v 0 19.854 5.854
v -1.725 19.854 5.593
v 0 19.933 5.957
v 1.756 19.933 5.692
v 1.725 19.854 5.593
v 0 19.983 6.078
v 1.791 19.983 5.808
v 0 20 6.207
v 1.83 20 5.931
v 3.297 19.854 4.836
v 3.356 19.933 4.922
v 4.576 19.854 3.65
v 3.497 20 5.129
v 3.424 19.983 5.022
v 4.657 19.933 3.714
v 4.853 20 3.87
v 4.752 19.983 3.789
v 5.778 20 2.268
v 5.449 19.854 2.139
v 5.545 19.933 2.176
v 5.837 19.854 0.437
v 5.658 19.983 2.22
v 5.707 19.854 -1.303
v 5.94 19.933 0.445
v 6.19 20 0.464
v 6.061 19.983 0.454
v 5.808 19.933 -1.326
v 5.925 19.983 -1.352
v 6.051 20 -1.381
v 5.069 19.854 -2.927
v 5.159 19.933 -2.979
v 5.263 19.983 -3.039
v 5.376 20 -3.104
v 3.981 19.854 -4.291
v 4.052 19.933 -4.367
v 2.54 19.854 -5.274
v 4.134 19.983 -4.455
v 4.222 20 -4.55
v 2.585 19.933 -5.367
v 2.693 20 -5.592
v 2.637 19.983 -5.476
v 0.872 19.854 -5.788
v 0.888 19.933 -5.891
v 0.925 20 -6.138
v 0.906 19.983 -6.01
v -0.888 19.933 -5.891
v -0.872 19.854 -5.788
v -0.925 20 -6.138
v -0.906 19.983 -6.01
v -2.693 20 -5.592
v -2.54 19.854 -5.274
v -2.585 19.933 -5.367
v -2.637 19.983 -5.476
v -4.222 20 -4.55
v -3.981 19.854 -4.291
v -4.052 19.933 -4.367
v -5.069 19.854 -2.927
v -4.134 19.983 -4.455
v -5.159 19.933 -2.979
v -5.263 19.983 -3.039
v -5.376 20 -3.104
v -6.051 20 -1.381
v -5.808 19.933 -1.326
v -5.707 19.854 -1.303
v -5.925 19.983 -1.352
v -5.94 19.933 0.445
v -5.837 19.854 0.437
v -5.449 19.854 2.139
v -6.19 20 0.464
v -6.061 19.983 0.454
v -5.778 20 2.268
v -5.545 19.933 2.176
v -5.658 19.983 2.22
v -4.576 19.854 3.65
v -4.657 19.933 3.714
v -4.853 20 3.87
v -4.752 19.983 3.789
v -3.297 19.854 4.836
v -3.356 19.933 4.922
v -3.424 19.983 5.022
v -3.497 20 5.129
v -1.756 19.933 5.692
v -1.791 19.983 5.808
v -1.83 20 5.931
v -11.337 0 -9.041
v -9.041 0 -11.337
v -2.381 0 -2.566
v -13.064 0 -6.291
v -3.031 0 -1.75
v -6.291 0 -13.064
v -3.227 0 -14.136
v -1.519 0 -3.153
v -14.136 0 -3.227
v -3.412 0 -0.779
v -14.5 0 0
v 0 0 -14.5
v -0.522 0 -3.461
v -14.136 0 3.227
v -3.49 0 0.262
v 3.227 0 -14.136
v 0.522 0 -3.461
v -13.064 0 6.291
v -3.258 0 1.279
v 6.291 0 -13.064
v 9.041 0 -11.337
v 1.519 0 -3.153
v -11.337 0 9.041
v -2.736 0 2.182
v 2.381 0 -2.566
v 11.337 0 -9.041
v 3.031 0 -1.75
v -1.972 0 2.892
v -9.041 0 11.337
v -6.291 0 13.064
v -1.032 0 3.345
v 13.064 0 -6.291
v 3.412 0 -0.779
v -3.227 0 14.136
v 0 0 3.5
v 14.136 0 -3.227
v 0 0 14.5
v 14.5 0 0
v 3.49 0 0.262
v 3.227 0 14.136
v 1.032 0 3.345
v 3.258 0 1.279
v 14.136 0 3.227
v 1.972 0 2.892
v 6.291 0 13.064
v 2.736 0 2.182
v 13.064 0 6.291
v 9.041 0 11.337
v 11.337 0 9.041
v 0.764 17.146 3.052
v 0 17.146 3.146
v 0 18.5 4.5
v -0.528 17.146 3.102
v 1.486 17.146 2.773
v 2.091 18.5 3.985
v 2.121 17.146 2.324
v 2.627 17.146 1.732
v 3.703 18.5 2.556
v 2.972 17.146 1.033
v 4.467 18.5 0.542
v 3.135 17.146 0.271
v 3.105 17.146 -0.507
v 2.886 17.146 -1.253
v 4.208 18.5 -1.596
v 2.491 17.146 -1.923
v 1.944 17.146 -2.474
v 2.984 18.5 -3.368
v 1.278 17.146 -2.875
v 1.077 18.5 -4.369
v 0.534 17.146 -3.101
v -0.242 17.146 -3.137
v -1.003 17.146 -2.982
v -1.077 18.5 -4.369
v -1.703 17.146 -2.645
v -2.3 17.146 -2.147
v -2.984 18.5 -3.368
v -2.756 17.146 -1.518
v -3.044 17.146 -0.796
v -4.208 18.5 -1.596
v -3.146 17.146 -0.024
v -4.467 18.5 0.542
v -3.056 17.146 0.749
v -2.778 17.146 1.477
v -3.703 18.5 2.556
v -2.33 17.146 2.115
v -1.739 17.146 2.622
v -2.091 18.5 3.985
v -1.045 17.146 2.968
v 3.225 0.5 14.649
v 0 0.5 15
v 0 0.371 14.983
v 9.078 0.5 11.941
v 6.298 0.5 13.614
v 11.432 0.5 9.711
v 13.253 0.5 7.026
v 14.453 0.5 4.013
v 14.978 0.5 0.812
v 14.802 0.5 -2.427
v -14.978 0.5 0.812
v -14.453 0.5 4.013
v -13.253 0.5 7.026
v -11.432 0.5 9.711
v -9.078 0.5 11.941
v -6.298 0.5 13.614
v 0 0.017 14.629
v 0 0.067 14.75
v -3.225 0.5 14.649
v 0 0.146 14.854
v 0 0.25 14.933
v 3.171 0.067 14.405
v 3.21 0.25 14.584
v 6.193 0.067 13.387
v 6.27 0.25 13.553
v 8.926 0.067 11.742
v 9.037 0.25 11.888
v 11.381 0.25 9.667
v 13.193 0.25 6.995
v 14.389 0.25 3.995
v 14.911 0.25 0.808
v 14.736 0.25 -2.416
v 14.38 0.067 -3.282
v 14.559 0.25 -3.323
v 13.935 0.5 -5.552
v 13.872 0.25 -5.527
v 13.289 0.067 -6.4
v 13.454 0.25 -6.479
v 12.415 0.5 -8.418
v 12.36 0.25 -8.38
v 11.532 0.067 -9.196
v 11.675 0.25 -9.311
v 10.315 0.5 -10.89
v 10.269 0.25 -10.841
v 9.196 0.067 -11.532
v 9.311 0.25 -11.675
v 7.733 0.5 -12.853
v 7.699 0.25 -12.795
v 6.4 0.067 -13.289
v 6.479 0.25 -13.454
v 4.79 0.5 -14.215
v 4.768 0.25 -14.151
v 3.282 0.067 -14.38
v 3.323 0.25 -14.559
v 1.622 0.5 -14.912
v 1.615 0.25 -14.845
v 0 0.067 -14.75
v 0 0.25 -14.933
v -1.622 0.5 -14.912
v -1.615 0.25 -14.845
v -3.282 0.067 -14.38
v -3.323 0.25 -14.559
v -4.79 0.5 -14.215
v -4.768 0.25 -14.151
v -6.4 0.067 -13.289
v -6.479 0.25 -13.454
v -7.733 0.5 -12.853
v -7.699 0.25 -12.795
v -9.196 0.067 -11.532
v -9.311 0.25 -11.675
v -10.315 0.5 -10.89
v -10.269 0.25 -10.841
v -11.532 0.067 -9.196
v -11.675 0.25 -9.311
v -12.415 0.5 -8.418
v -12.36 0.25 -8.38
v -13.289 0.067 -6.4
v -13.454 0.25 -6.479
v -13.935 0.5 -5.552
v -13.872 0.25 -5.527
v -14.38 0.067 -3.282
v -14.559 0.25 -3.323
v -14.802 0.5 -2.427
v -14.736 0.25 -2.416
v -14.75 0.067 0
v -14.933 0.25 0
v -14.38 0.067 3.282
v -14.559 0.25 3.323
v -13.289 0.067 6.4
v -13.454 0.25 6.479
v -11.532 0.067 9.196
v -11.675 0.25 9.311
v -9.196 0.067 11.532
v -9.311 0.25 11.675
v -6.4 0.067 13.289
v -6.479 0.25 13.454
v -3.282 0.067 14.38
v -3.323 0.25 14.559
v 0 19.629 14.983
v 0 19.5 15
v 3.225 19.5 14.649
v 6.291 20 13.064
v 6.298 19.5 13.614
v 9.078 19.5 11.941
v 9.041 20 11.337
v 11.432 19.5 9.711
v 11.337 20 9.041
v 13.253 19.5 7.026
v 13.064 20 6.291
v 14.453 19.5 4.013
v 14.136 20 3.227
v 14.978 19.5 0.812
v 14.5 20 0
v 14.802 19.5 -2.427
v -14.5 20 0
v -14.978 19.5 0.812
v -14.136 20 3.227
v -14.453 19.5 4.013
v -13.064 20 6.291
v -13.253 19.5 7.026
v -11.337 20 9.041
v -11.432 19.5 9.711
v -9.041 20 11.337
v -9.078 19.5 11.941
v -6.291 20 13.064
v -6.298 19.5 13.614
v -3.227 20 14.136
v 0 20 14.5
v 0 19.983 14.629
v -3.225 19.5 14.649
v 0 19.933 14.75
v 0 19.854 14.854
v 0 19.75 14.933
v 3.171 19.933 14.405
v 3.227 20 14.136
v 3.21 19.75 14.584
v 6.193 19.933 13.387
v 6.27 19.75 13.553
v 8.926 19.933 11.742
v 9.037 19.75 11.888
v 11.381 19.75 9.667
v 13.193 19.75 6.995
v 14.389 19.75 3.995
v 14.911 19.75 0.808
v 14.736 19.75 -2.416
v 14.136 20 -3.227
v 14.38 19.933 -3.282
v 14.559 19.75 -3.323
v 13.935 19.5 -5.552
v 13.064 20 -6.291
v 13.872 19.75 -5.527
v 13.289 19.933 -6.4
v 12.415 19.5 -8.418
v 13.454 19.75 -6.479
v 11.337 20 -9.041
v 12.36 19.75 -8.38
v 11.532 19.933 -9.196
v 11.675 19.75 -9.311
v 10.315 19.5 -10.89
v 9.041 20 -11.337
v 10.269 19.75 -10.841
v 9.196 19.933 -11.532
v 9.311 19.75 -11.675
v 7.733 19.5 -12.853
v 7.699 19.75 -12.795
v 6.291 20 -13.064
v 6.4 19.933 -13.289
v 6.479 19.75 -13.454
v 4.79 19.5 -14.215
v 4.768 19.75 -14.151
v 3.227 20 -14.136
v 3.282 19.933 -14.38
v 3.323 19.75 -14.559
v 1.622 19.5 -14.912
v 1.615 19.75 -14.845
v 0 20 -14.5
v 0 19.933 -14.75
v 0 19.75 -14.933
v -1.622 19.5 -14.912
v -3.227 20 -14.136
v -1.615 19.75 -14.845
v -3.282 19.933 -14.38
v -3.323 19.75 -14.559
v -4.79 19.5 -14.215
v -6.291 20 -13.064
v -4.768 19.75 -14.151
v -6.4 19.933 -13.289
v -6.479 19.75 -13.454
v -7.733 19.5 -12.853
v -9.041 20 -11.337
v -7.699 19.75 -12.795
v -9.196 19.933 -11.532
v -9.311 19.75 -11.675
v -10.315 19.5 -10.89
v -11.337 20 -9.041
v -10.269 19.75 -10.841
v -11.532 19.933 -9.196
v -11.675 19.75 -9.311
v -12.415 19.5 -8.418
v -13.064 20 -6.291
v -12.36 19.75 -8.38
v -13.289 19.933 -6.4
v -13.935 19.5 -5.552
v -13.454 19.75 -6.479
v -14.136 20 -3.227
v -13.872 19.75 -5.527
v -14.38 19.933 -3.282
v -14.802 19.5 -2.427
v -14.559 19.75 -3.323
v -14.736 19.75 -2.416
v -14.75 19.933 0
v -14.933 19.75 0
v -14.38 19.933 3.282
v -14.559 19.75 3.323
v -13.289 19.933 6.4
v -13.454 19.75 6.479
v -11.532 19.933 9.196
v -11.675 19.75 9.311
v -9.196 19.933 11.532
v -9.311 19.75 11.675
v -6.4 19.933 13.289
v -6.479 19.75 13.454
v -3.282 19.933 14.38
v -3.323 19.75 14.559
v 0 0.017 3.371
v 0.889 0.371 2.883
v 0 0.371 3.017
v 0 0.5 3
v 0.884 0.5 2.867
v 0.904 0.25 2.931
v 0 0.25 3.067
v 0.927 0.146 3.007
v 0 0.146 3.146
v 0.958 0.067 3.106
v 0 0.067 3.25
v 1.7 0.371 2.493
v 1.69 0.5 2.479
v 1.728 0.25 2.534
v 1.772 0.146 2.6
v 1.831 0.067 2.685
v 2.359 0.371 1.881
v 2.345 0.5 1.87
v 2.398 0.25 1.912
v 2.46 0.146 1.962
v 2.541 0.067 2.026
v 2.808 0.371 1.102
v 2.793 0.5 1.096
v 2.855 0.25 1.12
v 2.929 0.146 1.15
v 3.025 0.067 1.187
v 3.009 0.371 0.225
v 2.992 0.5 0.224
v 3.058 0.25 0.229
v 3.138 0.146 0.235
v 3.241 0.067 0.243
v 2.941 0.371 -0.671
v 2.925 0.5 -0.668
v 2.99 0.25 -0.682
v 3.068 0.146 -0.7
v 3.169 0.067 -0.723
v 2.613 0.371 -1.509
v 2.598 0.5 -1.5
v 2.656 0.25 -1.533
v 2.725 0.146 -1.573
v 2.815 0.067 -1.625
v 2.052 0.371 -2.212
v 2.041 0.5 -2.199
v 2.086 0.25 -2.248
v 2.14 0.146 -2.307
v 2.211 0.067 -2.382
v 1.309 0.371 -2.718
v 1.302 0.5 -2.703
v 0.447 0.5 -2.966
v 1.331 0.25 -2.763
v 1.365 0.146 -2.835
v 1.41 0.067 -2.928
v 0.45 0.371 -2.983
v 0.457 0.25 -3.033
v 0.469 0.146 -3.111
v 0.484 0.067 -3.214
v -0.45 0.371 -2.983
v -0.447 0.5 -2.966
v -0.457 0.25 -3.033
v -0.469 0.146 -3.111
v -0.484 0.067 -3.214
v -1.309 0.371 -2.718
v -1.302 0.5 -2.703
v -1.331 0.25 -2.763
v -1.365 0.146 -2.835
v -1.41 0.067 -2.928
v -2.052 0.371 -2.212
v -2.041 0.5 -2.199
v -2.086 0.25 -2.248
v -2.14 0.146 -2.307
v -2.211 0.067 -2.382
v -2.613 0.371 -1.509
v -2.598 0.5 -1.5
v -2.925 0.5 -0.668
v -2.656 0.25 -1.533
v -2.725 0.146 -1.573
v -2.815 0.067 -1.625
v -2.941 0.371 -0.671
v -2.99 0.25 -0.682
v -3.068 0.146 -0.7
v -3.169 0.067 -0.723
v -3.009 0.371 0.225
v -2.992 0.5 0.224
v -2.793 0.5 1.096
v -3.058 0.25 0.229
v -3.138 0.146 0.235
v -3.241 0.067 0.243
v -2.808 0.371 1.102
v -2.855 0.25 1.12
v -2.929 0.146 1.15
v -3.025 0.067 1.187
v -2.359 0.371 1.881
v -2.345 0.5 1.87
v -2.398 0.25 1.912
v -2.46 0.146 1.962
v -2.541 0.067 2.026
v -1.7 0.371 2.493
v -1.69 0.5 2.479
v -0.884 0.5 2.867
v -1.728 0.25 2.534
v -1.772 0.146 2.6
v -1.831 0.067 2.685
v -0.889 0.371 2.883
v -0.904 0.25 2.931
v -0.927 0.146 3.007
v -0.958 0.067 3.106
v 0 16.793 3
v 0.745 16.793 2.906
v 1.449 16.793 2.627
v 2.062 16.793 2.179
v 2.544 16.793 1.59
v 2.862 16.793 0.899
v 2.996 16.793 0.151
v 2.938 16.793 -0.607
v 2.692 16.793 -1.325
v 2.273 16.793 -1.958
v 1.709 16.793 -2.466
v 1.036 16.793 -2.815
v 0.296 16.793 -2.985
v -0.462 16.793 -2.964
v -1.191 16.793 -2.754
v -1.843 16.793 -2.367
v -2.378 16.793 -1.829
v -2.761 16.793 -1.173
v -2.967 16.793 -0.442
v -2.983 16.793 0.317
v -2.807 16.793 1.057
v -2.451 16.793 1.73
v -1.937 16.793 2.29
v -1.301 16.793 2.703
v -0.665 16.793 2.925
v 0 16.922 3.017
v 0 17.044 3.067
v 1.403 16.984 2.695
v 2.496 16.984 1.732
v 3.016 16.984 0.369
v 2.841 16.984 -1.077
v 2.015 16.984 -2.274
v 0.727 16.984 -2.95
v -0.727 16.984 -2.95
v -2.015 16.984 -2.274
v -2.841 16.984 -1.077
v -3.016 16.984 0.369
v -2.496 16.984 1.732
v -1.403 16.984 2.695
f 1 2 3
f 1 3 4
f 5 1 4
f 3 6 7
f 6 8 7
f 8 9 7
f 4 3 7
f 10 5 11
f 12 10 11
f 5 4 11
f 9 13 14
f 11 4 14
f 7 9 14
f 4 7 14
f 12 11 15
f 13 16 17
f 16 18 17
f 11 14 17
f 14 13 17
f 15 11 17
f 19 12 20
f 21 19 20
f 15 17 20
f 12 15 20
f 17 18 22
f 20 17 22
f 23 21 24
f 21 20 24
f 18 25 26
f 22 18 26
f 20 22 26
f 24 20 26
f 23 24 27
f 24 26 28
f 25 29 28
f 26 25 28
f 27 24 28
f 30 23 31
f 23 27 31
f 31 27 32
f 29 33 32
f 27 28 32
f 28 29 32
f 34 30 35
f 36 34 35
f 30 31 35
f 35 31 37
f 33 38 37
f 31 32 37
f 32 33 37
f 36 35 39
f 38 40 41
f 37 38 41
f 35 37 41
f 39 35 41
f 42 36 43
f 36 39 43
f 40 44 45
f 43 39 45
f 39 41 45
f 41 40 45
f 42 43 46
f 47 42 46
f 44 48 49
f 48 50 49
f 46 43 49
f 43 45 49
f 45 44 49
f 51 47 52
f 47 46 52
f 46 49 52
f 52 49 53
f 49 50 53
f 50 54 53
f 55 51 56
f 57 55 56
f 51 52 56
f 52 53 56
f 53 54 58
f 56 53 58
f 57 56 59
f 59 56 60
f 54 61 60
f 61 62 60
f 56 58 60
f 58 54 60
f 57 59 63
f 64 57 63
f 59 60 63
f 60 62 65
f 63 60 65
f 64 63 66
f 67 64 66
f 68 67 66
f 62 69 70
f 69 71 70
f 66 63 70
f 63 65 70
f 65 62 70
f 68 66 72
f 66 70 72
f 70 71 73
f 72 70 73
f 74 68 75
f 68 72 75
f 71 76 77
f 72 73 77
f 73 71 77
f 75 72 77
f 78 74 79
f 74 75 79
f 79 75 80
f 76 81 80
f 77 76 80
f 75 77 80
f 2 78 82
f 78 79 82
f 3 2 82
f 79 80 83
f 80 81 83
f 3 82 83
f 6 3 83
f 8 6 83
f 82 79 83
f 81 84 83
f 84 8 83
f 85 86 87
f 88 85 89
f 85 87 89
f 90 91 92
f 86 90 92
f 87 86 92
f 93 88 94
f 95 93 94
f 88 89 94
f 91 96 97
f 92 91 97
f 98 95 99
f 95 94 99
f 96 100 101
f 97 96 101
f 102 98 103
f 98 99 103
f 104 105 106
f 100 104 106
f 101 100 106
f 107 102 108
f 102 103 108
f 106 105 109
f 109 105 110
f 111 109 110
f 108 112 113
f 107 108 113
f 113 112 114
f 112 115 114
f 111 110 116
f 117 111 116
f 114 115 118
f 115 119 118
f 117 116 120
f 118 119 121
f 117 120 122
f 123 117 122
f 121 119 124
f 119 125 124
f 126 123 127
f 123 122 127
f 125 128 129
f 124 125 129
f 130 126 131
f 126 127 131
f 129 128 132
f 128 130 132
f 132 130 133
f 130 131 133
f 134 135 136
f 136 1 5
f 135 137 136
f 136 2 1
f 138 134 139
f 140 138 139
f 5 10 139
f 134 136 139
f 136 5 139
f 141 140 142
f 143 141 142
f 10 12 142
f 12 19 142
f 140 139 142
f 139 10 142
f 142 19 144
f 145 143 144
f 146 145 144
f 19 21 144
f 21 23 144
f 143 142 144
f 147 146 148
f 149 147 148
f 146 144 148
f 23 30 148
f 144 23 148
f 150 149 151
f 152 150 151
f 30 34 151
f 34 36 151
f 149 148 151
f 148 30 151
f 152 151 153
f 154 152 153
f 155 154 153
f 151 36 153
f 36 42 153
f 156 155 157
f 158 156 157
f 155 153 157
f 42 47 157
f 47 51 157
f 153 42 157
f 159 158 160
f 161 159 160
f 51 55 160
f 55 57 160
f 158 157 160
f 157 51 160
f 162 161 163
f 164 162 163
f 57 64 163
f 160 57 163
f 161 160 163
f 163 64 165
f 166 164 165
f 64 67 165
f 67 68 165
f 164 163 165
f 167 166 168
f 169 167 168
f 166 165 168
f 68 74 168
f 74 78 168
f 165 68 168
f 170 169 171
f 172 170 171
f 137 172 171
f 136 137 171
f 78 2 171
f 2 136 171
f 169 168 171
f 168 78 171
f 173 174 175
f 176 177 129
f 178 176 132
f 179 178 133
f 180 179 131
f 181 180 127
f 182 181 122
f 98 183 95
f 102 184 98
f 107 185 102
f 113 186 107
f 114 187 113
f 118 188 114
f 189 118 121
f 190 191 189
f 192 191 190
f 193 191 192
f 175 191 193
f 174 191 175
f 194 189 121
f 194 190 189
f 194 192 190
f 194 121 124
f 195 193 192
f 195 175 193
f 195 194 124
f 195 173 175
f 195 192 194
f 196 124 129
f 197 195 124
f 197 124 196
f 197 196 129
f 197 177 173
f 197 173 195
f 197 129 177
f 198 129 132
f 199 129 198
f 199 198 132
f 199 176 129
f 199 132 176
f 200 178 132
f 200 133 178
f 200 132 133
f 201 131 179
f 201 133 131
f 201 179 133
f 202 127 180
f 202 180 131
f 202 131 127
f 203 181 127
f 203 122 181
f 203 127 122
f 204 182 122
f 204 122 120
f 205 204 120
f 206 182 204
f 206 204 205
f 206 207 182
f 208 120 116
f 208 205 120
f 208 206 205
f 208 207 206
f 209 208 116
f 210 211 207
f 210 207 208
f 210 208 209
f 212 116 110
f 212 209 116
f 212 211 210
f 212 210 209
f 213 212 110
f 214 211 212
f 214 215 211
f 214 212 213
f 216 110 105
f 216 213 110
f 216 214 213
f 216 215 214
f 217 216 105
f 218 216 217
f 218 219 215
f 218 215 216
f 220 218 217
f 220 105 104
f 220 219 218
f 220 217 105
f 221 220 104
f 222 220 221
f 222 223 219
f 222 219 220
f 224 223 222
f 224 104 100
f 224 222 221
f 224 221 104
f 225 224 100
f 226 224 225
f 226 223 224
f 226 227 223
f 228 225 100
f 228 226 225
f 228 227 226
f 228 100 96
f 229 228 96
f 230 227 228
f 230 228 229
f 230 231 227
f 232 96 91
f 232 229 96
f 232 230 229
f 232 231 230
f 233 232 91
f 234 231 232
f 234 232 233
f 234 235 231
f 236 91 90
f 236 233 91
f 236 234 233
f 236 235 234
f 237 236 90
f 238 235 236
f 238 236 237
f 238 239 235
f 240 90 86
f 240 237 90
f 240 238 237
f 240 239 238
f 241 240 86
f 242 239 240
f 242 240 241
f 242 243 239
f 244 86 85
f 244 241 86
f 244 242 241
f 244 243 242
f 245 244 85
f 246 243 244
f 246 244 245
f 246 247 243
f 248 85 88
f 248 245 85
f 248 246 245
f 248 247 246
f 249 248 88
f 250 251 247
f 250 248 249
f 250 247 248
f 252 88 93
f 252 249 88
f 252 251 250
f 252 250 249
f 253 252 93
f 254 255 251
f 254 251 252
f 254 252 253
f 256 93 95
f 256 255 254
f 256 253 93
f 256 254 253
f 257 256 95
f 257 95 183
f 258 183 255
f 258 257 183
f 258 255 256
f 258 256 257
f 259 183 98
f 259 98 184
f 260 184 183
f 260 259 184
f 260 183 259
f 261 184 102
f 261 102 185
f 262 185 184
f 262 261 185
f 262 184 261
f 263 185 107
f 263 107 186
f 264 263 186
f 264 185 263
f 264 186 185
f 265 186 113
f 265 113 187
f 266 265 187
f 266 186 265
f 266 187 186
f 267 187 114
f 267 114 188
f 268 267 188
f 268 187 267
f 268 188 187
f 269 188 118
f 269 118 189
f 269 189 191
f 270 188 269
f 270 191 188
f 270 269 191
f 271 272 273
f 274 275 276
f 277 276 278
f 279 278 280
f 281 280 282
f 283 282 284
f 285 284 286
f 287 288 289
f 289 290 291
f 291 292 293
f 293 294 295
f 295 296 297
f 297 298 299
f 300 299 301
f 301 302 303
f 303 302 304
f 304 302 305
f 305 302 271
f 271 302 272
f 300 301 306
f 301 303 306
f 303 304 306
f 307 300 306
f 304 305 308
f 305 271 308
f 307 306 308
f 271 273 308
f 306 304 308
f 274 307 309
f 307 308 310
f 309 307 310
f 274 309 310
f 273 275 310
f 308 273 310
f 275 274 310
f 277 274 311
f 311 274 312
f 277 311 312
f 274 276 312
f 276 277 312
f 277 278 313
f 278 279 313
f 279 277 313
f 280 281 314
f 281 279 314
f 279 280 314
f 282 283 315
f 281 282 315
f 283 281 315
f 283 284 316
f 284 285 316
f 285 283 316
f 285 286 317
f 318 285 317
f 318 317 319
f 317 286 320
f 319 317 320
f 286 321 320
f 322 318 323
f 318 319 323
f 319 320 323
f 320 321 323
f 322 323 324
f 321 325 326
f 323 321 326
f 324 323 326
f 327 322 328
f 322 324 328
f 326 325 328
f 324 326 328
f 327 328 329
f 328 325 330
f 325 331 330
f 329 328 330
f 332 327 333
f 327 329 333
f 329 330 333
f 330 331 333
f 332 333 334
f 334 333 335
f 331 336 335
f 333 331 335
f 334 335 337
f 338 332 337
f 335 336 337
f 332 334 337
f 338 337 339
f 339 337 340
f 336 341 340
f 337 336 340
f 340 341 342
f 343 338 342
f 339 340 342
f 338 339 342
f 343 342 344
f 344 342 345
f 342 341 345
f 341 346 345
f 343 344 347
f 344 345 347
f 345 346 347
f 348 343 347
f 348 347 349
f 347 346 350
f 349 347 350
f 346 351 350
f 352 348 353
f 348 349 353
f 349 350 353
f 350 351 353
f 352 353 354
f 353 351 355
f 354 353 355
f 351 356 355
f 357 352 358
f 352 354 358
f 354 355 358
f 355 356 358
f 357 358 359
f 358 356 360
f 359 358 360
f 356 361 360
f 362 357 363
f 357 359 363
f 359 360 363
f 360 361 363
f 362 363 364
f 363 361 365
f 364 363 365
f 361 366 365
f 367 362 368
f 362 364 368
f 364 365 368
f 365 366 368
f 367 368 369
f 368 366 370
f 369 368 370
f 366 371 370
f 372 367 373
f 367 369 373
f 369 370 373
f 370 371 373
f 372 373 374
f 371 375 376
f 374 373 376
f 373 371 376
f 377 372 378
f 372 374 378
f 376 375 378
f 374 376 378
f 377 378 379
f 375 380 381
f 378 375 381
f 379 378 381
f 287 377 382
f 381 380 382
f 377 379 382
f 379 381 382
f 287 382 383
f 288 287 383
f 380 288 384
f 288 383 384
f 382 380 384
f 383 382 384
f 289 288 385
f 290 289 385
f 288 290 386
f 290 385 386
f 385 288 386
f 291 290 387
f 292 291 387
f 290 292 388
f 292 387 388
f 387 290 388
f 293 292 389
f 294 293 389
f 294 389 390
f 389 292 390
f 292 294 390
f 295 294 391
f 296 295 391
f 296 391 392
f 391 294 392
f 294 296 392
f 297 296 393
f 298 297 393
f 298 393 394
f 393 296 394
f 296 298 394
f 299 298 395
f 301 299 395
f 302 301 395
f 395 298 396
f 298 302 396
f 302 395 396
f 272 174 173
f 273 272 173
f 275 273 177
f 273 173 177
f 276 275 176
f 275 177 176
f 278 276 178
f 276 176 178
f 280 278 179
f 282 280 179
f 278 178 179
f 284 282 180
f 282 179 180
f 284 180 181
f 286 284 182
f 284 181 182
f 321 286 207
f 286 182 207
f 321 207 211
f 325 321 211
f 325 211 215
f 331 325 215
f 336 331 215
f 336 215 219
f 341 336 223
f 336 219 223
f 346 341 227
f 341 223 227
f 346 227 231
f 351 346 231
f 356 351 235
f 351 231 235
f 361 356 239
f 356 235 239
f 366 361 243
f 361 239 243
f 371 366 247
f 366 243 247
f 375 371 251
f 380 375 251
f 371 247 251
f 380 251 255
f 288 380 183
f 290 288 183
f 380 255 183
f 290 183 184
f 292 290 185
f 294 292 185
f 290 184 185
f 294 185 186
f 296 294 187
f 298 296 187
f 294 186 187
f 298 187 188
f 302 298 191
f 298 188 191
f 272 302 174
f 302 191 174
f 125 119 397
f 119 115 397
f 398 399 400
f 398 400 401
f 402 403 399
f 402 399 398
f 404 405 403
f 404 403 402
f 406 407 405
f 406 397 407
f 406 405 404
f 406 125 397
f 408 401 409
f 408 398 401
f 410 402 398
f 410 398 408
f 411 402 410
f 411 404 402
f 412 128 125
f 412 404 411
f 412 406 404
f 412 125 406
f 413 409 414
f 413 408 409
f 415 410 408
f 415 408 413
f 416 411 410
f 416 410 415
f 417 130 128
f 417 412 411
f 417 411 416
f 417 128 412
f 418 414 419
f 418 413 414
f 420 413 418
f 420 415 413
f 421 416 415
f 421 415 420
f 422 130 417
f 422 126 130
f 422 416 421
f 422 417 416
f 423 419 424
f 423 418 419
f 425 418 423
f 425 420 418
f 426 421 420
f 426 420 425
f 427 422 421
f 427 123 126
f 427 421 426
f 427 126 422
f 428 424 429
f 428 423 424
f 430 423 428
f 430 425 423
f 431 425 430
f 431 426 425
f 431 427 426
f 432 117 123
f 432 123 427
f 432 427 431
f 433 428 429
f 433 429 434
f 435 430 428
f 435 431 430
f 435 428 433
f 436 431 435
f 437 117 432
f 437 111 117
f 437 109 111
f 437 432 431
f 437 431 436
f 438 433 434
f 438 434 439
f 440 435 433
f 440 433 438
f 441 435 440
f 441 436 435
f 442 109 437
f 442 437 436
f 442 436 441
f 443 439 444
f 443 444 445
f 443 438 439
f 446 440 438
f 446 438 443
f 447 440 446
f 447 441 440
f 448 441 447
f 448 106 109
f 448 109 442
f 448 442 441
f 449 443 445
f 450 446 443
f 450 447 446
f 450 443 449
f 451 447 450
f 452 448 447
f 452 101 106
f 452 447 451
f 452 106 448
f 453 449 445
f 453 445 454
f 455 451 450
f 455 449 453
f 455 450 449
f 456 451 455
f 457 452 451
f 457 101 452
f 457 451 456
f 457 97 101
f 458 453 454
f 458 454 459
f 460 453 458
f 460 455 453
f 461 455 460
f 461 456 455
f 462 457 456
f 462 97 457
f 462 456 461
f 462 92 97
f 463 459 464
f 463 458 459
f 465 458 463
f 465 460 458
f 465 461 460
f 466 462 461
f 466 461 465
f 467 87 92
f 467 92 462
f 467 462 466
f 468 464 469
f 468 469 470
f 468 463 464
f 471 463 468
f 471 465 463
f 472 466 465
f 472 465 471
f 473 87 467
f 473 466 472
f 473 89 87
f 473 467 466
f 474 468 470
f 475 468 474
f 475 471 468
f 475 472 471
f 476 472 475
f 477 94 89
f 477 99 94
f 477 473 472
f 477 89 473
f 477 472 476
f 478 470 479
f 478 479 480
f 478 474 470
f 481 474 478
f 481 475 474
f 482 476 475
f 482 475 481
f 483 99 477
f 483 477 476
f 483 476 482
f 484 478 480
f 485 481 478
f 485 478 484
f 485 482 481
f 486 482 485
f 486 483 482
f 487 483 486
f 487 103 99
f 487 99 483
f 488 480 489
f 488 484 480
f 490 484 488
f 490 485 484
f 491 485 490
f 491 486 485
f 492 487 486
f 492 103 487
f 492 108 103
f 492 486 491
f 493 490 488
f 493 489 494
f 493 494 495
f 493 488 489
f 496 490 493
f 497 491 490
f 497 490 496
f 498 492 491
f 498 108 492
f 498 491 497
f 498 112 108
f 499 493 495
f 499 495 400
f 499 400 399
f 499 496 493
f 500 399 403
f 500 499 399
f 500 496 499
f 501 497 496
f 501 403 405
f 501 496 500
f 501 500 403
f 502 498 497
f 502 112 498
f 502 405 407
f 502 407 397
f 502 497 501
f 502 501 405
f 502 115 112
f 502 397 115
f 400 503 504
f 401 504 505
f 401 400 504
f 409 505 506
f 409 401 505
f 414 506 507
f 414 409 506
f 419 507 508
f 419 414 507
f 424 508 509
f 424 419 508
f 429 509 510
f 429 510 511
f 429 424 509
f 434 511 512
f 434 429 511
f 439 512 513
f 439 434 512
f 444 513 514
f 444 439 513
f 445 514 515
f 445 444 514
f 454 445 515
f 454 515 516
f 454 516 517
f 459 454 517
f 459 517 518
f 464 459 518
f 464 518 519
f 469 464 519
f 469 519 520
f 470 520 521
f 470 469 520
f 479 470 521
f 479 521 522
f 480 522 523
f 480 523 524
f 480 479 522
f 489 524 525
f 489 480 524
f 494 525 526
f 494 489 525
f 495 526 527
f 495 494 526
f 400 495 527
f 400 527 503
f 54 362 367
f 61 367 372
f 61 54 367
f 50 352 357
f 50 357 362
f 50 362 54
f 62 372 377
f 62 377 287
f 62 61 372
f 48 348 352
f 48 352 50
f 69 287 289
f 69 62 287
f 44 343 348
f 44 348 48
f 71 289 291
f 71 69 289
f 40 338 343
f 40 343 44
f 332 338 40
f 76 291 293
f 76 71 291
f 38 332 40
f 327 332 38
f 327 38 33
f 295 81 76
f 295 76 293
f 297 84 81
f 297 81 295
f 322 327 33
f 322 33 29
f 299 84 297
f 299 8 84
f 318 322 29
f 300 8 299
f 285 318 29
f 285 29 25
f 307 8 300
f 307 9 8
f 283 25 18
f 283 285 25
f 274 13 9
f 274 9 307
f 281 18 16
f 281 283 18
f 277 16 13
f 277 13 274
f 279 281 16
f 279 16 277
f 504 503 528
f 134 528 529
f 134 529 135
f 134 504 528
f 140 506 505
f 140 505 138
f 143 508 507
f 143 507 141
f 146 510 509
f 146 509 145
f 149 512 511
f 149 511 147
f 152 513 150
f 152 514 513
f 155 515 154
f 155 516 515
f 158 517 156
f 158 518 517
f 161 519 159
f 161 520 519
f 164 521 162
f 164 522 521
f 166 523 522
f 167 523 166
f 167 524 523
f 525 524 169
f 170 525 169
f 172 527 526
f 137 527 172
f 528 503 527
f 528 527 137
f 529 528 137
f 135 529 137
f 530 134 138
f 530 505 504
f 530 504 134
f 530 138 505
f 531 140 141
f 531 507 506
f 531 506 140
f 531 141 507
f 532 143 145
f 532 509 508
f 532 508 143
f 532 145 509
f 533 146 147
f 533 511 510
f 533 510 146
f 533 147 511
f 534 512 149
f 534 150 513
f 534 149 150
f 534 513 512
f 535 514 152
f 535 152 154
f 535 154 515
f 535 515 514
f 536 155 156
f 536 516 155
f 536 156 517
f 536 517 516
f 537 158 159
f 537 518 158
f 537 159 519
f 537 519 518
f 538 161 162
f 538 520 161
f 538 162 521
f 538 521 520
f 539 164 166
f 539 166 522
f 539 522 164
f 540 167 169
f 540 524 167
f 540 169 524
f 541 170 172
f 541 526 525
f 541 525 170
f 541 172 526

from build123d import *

# Parameters (mm, degrees)
SKETCH1_R           = 15
SKETCH1_R_2         = 3
BOSS_EXTRUDE1_DEPTH = 20
CHAMFER1_SIZE       = 3
FILLET1_R           = 0.5


with BuildPart() as part:
    # Sketch1 → Boss-Extrude1 (new body)
    with BuildSketch(Plane(origin=(0, 0, 0), x_dir=(1, 0, 0), z_dir=(0, 1, 0))):
        with Locations(Location((0, 0, 0), (0, 0, 270))):
            Circle(SKETCH1_R)
        with Locations(Location((0, 0, 0), (0, 0, 270))):
            Circle(SKETCH1_R_2, mode=Mode.SUBTRACT)
    extrude(amount=BOSS_EXTRUDE1_DEPTH)

    # Chamfer1
    chamfer1_edges = [part.edges().sort_by_distance(p)[0] for p in [
        (0, 20, -3),
    ]]
    chamfer(chamfer1_edges, length=CHAMFER1_SIZE)

    # Fillet1
    fillet1_edges = [part.edges().sort_by_distance(p)[0] for p in [
        (0, 0, -15),
        (0, 20, -15),
        (0, 0, -3),
        (0, 17, -3),
        (0, 20, -6),
    ]]
    fillet(fillet1_edges, radius=FILLET1_R)


solid = part.part
